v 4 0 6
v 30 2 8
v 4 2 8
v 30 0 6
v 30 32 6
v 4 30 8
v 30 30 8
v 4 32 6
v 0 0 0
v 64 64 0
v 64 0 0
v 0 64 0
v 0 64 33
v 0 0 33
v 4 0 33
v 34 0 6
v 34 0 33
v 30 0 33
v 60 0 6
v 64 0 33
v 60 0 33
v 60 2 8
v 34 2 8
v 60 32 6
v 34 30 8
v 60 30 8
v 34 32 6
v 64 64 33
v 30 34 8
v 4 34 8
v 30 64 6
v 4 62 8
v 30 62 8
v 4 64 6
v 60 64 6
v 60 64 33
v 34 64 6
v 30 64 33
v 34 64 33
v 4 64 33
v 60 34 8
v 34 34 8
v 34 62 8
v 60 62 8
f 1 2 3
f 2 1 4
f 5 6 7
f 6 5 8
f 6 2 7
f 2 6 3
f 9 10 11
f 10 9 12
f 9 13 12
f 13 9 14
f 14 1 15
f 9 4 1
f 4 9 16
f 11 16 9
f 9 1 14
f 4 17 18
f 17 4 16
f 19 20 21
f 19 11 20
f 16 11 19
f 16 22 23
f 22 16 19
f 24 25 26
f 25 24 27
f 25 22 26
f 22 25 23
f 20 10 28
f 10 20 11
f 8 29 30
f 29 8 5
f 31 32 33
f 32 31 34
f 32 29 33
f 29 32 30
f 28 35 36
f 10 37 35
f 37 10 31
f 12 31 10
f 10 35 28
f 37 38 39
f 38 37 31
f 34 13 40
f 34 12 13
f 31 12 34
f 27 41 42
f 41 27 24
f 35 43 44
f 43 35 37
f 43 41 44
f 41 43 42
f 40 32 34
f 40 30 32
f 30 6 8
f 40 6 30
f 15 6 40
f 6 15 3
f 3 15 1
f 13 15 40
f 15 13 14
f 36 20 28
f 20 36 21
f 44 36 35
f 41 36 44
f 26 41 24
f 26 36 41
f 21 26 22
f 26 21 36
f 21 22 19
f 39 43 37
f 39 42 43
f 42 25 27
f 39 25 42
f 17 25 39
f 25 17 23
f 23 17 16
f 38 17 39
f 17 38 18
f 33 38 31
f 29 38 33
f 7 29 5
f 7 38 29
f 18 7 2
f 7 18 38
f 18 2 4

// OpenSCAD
// file: WylochStyleDungeonLibrary.scad
size = 32;
baseheight = 6;
topperheight = 2;
topperrounded = true;
walllength = size;
wallheight = 25 + baseheight + topperheight;
wallwidth = 6;
wallwidththin = 4;

function hypotenuse_ra(side_a, side_b) =
    sqrt(pow(side_a, 2) + pow(side_b, 2));
    
module wsdl_Base(s,bh)
{
    cube([s,s,bh]);
}

module wsdl_Topper(s,bh,th,tr)
{
    if (tr) {
        translate([0,0,bh])
            intersection() {
                difference () {
                        cube([s,s,th]);
                        union () {
                        rotate(a=45, v=[1,0,0])
                            cube([s,th*2,th*2]);
                        translate([0,s,0])
                            rotate(a=45, v=[1,0,0])
                                cube([s,th*2,th*2]);
                        rotate(a=-45, v=[0,1,0])
                            cube([th*2,s,th*2]);
                        translate([s,0,0])
                            rotate(a=-45, v=[0,1,0])
                                cube([th*2,s,th*2]);
                        }
                }
                translate([s/2,s/2,0])
                    cylinder(
                        h=th, 
                        r1=hypotenuse_ra(s/2-1.2, s/2-1.2), 
                        r2=hypotenuse_ra(s/2-th-.8, s/2-th-.8), 
                        center=false, 
                        $fa=.1);
            }    
    }
    else {
        translate([0,0,bh])
            difference() {
                cube([s,s,th]);
                union () {
                rotate(a=45, v=[1,0,0])
                    cube([s,th*2,th*2]);
                translate([0,s,0])
                    rotate(a=45, v=[1,0,0])
                        cube([s,th*2,th*2]);
                rotate(a=-45, v=[0,1,0])
                    cube([th*2,s,th*2]);
                translate([s,0,0])
                    rotate(a=-45, v=[0,1,0])
                        cube([th*2,s,th*2]);
                }
            }    
    }
}

module wsdl_Base_1x1(s,bh,th,tr) 
{
    union () {
        wsdl_Base(s,bh);
        wsdl_Topper(s,bh,th,tr);
    }
}

module wsdl_Base_1x2(s,bh,th,tr)
{
    union () {
        wsdl_Base_1x1(s,bh,th,tr);
        translate([s,0,0])
            wsdl_Base_1x1(s,bh,th,tr);
    }
}
 
module wsdl_Base_2x2(s,bh,th,tr)
{
    union () {
        wsdl_Base_1x2(s,bh,th,tr);
        translate([0,s,0])
            wsdl_Base_1x2(s,bh,th,tr);
    }
}
 
module wsdl_Base_2x4(s,bh,th,tr)
{
    union () {
        wsdl_Base_2x2(s,bh,th,tr);
        translate([s*2,0,0])
            wsdl_Base_2x2(s,bh,th,tr);
    }
}
 
module wsdl_Base_4x4(s,bh,th,tr)
{
    union () {
        wsdl_Base_2x4(s,bh,th,tr);
        translate([0,s*2,0])
            wsdl_Base_2x4(s,bh,th,tr);
    }
}
 
module wsdl_Wall_1(w,l,h)
{
    cube([w,l,h]);   
}

module wsdl_Wall_2(w,l,h)
{
    union() {
        wsdl_Wall_1(w,l,h);
        translate([0,l,0])
            wsdl_Wall_1(w,l,h);
    }
}

module wsdl_Wall_1_Left(w,l,h) 
{
    wsdl_Wall_1(w,l,h);
}

module wsdl_Wall_1_Right(w,l,h) 
{
    translate([(size)-w,0,0])
        wsdl_Wall_1(w,l,h);
}

module wsdl_Wall_1_DoubleRight(w,l,h) 
{
    translate([(size*2)-w,0,0])
        wsdl_Wall_1(w,l,h);
}

module wsdl_Wall_1_Bottom(w,l,h) 
{
rotate(a=-90)
    translate([-w,0,0])
        wsdl_Wall_1(w,l,h);

}

module wsdl_Wall_1_Top(w,l,h) 
{
rotate(a=-90)
    translate([-l,0,0])
        wsdl_Wall_1(w,l,h);

}

module wsdl_Wall_1_Center(w,l,h) 
{
    translate([(size)-w/2,0,0])
        wsdl_Wall_1(w,l,h);
}


module wsdl_Wall_2_Left(w,l,h) 
{
    wsdl_Wall_2(w,l,h);
}

module wsdl_Wall_2_Right(w,l,h) 
{
    translate([(size*2)-w,0,0])
        wsdl_Wall_2(w,l,h);
}

module wsdl_Wall_2_Bottom(w,l,h) 
{
rotate(a=-90)
    translate([-w,0,0])
        wsdl_Wall_2(w,l,h);

}

module wsdl_Wall_2_Top(w,l,h) 
{
rotate(a=-90)
    translate([-l*2,0,0])
        wsdl_Wall_2(w,l,h);

}

module wsdl_Wall_2_Center(w,l,h) 
{
    translate([(size)-w/2,0,0])
        wsdl_Wall_2(w,l,h);
}
// main file
include <WylochStyleDungeonLibrary.scad>; 
 
wsdl_Base_2x2(size,baseheight,topperheight,topperrounded=false);
wsdl_Wall_2_Left(wallwidththin,walllength,wallheight);
wsdl_Wall_2_Right(wallwidththin,walllength,wallheight);
wsdl_Wall_2_Center(wallwidththin,walllength,wallheight);
